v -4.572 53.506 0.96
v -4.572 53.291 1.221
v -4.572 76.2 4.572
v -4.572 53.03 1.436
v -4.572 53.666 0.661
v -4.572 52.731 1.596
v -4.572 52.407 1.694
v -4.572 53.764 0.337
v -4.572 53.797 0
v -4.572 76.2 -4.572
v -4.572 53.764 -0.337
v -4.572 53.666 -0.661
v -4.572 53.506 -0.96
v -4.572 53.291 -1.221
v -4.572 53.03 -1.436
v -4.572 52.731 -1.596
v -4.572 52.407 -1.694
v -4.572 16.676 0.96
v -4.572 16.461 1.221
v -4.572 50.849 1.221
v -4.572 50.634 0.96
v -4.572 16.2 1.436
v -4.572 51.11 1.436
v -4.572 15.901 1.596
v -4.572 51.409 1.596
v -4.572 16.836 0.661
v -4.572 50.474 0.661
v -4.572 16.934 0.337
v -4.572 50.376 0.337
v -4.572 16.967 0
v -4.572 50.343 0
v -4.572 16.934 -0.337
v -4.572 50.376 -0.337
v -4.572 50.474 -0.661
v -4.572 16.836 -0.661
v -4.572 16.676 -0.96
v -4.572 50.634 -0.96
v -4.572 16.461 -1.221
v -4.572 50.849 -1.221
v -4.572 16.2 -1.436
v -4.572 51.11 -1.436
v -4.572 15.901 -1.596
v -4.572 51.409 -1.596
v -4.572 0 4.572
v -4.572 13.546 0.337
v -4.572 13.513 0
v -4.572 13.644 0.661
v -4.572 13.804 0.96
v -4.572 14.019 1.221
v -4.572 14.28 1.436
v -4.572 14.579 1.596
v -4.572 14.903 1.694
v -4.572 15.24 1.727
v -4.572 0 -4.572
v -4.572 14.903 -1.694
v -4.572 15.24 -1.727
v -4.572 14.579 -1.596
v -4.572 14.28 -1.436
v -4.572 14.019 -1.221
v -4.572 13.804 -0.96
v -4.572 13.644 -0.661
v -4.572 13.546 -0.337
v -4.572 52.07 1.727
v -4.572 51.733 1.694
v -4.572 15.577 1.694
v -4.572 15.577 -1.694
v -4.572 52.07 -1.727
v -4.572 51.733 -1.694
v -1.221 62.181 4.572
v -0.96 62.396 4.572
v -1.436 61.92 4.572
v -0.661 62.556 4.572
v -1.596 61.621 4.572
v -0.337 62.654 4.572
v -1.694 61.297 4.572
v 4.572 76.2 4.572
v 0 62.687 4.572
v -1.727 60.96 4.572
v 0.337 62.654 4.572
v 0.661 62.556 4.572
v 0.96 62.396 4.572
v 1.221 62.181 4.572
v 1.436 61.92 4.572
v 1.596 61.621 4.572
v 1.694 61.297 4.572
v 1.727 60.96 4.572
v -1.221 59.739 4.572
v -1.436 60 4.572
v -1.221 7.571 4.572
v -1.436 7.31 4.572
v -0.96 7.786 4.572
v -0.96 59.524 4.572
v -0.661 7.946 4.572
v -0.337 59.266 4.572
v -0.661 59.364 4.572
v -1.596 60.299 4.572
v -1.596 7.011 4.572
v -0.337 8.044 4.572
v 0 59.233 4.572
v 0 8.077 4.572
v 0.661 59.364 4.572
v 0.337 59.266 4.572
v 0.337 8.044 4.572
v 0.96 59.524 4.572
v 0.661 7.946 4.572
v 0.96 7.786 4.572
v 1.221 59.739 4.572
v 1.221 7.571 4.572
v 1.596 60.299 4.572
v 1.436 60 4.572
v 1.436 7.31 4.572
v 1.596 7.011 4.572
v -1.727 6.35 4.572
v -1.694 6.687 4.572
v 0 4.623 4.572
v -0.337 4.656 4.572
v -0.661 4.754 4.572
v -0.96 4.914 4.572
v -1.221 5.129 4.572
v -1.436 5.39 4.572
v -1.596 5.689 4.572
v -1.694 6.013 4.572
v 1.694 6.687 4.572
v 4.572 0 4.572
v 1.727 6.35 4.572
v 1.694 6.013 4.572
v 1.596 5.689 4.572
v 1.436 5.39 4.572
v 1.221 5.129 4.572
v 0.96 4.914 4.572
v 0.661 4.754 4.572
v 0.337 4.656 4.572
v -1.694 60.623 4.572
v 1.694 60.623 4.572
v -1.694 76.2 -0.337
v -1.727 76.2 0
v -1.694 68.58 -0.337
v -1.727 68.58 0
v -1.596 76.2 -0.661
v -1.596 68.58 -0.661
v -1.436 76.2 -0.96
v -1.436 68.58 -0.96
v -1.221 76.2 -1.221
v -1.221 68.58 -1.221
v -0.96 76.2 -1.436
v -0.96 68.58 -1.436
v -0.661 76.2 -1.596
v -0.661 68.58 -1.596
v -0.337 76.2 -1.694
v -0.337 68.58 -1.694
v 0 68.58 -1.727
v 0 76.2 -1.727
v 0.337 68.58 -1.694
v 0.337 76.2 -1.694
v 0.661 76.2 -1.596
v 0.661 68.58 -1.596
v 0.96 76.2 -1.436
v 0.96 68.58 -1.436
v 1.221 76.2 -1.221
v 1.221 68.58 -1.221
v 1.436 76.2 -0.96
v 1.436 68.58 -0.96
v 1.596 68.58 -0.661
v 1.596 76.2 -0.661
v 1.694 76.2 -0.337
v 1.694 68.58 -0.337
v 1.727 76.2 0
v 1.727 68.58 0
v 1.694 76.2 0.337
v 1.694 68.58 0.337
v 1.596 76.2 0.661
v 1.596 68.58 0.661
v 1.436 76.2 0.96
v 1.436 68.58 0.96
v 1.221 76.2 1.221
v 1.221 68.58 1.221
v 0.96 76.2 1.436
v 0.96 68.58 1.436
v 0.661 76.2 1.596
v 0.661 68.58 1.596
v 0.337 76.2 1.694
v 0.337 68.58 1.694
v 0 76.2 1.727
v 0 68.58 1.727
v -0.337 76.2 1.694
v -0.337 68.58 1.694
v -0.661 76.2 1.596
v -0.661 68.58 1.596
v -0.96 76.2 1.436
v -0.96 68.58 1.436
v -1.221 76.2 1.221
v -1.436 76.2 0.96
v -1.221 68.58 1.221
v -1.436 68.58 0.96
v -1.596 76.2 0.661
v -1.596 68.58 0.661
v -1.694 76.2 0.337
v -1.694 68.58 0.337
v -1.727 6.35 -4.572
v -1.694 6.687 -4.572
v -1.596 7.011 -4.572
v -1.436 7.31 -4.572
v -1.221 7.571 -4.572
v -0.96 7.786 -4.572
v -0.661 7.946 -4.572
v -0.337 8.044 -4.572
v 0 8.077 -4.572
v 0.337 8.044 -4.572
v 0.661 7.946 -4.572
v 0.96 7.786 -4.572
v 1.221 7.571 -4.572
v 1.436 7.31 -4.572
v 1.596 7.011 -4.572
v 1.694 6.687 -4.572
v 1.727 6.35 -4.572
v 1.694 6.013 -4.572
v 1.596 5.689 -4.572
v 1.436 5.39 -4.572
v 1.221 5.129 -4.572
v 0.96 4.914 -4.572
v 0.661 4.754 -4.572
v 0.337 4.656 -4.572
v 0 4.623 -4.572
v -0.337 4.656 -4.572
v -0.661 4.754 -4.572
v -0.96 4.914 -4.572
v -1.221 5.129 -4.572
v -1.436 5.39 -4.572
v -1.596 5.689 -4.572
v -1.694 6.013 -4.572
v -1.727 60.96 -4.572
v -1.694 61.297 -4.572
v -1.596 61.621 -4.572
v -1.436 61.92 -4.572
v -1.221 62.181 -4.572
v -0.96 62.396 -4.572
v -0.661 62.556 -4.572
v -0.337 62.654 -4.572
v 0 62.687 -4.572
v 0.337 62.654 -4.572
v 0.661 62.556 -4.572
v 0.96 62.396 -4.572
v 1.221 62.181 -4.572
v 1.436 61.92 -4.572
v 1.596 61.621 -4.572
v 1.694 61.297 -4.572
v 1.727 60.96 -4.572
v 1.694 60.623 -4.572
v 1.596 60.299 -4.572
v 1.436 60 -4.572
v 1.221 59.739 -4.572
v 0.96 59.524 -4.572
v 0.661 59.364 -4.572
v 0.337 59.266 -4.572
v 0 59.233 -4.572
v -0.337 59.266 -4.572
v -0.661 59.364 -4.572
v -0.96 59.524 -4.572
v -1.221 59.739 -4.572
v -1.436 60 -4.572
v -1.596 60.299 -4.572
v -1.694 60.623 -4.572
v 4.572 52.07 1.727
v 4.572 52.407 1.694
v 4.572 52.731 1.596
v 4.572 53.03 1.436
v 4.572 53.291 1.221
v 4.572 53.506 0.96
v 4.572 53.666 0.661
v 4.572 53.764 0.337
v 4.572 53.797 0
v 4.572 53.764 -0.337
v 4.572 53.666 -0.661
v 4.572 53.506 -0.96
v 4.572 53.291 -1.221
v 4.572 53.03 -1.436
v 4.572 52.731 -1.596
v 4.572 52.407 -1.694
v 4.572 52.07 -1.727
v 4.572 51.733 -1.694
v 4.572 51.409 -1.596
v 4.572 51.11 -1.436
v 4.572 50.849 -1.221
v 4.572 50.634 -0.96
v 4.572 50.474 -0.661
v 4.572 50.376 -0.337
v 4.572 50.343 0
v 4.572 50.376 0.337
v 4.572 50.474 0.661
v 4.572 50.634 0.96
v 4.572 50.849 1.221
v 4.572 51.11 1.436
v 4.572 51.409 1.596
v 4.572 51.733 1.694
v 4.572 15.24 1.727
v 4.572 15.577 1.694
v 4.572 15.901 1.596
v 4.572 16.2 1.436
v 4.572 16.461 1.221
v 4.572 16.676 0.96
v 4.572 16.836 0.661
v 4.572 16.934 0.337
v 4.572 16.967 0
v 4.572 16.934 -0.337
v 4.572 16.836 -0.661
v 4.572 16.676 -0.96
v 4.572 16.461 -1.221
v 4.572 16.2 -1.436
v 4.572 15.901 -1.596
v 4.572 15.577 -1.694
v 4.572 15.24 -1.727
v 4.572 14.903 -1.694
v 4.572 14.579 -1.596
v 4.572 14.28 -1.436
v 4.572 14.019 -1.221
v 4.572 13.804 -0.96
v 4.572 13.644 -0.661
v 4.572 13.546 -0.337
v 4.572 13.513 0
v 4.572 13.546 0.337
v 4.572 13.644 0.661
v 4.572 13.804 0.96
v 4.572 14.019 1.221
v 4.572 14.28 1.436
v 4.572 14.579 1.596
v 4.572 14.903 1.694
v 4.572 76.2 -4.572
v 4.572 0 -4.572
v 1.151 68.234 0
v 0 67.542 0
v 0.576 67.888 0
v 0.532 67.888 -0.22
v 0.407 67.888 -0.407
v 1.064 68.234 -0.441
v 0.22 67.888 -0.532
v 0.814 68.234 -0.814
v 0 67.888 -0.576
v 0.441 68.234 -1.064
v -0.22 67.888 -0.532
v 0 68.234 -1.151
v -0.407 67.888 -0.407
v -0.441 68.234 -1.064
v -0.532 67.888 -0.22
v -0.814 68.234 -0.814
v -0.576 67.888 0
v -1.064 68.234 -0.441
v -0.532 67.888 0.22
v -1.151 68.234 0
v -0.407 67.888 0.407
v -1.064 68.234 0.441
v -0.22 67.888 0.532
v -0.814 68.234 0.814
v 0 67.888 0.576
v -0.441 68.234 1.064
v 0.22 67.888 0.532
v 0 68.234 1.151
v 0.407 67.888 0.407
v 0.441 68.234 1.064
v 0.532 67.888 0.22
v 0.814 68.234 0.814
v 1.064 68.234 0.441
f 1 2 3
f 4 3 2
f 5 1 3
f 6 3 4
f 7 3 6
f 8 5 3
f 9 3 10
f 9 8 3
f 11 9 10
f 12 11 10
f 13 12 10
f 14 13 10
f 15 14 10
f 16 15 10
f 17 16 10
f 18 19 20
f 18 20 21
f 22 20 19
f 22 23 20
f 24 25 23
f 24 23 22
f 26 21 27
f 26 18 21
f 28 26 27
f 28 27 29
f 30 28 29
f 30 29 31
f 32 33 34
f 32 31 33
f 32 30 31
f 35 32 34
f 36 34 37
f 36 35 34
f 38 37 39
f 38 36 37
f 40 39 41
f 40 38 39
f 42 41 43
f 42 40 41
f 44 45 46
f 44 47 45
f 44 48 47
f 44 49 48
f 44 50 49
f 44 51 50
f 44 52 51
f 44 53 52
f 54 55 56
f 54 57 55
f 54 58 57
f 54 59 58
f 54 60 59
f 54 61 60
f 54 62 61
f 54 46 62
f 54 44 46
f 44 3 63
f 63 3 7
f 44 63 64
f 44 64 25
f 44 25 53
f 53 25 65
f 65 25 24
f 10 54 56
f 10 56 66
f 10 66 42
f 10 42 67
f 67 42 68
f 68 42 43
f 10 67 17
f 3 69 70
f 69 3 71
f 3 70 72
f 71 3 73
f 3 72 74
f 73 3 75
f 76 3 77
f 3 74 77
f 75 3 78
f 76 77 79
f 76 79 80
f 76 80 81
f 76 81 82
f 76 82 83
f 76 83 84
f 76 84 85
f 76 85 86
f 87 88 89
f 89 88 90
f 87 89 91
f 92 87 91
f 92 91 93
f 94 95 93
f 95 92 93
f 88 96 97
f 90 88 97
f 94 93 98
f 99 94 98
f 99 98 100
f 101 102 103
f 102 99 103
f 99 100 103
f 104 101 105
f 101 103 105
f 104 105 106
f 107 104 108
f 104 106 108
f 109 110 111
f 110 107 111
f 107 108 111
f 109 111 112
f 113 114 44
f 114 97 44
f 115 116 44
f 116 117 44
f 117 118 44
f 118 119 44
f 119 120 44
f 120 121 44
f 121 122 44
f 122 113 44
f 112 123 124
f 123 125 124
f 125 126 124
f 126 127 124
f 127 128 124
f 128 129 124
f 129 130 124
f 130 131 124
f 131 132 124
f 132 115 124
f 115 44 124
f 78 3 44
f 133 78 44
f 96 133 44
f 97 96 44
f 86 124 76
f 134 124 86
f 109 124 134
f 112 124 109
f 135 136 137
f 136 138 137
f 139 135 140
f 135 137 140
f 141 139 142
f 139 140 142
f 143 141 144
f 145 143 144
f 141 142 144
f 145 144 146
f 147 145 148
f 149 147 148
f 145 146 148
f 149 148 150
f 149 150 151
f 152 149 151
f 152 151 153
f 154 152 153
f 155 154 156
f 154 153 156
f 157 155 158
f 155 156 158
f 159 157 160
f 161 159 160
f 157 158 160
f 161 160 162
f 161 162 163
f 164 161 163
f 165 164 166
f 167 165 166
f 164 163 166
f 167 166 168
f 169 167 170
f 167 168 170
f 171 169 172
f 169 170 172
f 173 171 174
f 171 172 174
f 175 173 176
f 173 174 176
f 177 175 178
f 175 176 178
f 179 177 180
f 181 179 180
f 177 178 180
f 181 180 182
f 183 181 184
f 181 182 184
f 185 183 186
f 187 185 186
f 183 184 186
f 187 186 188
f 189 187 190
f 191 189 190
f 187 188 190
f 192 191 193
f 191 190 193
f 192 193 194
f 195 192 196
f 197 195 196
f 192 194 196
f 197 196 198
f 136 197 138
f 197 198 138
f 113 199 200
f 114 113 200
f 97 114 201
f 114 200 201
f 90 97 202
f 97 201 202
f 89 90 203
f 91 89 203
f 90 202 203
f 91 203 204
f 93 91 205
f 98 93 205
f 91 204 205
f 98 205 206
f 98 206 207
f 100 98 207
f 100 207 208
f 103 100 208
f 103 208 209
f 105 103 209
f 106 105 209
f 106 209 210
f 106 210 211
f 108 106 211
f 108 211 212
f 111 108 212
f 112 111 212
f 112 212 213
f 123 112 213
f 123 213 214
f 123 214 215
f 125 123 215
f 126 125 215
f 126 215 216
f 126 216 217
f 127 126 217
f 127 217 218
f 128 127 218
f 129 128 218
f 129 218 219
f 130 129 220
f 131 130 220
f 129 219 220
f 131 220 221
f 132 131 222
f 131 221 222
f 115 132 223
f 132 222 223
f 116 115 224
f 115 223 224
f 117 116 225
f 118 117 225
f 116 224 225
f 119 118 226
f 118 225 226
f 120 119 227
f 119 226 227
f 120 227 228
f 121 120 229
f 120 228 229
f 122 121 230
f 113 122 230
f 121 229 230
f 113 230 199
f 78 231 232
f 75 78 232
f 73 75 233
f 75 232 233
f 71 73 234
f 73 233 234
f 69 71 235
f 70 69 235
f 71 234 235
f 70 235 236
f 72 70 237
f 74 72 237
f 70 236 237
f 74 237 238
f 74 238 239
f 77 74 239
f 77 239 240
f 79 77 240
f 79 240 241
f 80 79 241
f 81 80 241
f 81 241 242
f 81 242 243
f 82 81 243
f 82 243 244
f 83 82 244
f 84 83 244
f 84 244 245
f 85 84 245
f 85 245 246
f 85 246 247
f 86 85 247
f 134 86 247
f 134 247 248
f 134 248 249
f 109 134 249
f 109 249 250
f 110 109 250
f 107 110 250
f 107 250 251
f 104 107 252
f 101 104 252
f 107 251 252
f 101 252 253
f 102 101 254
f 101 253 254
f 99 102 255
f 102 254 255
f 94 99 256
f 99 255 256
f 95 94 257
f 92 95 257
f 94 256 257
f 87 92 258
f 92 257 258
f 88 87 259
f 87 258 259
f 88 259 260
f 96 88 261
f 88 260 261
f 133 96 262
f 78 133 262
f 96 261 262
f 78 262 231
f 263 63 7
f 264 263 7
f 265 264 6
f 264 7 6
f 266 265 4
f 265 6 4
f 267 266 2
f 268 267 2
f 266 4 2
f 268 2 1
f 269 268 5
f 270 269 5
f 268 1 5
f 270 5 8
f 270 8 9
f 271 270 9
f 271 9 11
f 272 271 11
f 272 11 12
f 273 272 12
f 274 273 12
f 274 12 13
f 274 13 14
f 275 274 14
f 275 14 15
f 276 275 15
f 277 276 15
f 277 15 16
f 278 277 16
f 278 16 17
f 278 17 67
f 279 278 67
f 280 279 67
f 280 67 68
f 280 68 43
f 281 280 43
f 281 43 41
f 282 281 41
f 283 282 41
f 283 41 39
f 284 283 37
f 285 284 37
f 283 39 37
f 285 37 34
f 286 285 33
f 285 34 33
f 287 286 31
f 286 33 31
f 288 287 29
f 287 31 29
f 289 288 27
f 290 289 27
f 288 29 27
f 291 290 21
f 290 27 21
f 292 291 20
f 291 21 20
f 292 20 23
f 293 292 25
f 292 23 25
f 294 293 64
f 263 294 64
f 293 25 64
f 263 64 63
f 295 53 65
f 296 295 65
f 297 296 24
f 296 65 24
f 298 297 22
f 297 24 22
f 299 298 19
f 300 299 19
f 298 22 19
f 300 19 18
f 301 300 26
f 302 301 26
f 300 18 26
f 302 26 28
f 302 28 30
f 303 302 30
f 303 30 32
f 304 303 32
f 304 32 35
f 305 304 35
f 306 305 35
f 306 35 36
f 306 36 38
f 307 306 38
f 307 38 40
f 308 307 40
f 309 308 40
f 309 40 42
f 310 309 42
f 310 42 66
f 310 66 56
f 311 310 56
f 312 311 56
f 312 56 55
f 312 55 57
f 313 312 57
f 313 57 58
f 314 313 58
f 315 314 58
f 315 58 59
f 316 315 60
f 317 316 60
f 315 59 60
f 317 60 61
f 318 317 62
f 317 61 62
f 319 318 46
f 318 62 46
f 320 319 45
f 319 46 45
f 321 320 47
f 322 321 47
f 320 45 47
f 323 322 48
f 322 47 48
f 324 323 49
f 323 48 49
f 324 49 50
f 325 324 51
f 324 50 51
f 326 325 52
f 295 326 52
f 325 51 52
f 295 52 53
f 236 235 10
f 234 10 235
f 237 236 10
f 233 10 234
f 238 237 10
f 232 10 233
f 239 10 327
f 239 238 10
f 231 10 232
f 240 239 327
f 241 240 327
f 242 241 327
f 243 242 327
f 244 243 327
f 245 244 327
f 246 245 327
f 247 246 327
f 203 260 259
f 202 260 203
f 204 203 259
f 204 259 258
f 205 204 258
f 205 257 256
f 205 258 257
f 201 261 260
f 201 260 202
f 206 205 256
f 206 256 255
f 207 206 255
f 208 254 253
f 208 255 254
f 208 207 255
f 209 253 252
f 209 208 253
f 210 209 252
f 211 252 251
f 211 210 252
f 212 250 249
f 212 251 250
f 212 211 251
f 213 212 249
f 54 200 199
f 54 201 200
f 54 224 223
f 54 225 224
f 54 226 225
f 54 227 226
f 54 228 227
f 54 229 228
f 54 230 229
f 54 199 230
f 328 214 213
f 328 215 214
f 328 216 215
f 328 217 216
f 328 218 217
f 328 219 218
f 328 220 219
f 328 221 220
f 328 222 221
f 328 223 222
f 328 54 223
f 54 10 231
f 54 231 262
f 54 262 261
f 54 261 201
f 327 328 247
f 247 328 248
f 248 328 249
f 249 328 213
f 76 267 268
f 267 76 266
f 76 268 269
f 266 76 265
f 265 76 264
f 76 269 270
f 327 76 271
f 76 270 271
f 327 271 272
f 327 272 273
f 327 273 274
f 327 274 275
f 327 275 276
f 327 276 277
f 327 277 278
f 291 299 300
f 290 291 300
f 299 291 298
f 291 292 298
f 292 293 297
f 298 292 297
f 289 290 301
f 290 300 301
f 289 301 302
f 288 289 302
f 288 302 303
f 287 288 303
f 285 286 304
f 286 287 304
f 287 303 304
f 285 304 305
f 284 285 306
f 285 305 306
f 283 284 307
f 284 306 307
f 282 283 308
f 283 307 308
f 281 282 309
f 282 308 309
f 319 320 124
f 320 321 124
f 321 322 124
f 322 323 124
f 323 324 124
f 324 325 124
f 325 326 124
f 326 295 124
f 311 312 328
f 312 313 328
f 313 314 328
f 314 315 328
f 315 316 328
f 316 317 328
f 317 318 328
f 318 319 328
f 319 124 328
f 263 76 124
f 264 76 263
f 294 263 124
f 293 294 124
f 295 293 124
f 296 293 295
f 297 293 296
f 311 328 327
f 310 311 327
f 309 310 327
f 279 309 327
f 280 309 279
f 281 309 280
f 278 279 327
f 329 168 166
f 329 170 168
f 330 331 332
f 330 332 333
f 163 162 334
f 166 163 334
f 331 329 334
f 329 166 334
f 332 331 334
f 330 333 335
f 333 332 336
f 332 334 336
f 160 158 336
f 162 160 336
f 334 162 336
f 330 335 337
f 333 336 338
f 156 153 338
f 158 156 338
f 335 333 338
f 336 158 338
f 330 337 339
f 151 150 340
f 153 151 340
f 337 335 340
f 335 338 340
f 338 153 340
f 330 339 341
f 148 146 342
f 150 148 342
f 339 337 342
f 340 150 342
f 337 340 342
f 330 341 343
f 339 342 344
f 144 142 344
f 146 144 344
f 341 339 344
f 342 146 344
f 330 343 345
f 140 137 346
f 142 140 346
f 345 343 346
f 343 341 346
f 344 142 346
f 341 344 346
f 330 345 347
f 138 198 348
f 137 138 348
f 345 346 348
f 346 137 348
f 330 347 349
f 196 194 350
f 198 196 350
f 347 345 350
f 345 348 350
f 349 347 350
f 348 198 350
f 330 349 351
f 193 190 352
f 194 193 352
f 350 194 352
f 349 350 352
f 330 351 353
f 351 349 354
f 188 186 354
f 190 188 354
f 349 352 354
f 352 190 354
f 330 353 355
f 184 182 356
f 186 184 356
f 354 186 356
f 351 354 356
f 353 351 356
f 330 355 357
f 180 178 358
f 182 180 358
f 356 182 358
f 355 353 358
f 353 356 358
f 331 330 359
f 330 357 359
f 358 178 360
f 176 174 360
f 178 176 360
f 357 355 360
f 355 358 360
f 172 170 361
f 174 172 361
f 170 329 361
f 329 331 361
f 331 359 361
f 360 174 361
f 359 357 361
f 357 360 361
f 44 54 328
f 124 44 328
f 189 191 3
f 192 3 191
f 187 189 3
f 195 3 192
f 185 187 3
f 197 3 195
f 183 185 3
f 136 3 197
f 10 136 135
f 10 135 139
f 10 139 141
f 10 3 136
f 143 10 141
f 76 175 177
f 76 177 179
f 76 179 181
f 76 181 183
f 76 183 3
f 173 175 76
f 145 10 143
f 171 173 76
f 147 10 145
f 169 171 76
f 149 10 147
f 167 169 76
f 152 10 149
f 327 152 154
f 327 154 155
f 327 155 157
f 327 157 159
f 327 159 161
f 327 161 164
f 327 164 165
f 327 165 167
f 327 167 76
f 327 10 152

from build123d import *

# Parameters (mm, degrees)
SKETCH1_W                     = 9.144
SKETCH1_H                     = 9.144
BOSS_EXTRUDE1_DEPTH           = 76.2
TAP_DRILL_FOR_8_32_TAP1_D     = 3.4544
TAP_DRILL_FOR_8_32_TAP2_D     = 3.4544
TAP_DRILL_FOR_8_32_TAP3_D     = 3.4544
TAP_DRILL_FOR_8_32_TAP3_DEPTH = 7.62
TAP_DRILL_FOR_8_32_TAP3_TIP   = 1.037806461


with BuildPart() as part:
    # Sketch1 → Boss-Extrude1 (new body)
    with BuildSketch(Plane(origin=(0, 0, 0), x_dir=(1, 0, 0), z_dir=(0, 1, 0))):
        Rectangle(SKETCH1_W, SKETCH1_H)
    extrude(amount=BOSS_EXTRUDE1_DEPTH)

    # Tap Drill for #8-32 Tap1 (through all)
    with Locations(Plane.XY.offset(4.572)):
        with Locations((0, 60.96), (0, 6.35)):
            Hole(TAP_DRILL_FOR_8_32_TAP1_D / 2)

    # Tap Drill for #8-32 Tap2 (through all)
    with Locations(Plane(origin=(4.572, 0, 0), x_dir=(0, 0, -1), z_dir=(1, 0, 0))):
        with Locations((0, 52.07), (0, 15.24)):
            Hole(TAP_DRILL_FOR_8_32_TAP2_D / 2)

    # Tap Drill for #8-32 Tap3
    with Locations(Plane(origin=(0, 76.2, 0), x_dir=(1, 0, 0), z_dir=(0, 1, 0))):
        with Locations((0, 0)):
            Hole(TAP_DRILL_FOR_8_32_TAP3_D / 2, depth=TAP_DRILL_FOR_8_32_TAP3_DEPTH)
            with Locations((0, 0, -(TAP_DRILL_FOR_8_32_TAP3_DEPTH + TAP_DRILL_FOR_8_32_TAP3_TIP / 2))):  # 118° drill point
                Cone(0, TAP_DRILL_FOR_8_32_TAP3_D / 2, TAP_DRILL_FOR_8_32_TAP3_TIP, mode=Mode.SUBTRACT)


solid = part.part
